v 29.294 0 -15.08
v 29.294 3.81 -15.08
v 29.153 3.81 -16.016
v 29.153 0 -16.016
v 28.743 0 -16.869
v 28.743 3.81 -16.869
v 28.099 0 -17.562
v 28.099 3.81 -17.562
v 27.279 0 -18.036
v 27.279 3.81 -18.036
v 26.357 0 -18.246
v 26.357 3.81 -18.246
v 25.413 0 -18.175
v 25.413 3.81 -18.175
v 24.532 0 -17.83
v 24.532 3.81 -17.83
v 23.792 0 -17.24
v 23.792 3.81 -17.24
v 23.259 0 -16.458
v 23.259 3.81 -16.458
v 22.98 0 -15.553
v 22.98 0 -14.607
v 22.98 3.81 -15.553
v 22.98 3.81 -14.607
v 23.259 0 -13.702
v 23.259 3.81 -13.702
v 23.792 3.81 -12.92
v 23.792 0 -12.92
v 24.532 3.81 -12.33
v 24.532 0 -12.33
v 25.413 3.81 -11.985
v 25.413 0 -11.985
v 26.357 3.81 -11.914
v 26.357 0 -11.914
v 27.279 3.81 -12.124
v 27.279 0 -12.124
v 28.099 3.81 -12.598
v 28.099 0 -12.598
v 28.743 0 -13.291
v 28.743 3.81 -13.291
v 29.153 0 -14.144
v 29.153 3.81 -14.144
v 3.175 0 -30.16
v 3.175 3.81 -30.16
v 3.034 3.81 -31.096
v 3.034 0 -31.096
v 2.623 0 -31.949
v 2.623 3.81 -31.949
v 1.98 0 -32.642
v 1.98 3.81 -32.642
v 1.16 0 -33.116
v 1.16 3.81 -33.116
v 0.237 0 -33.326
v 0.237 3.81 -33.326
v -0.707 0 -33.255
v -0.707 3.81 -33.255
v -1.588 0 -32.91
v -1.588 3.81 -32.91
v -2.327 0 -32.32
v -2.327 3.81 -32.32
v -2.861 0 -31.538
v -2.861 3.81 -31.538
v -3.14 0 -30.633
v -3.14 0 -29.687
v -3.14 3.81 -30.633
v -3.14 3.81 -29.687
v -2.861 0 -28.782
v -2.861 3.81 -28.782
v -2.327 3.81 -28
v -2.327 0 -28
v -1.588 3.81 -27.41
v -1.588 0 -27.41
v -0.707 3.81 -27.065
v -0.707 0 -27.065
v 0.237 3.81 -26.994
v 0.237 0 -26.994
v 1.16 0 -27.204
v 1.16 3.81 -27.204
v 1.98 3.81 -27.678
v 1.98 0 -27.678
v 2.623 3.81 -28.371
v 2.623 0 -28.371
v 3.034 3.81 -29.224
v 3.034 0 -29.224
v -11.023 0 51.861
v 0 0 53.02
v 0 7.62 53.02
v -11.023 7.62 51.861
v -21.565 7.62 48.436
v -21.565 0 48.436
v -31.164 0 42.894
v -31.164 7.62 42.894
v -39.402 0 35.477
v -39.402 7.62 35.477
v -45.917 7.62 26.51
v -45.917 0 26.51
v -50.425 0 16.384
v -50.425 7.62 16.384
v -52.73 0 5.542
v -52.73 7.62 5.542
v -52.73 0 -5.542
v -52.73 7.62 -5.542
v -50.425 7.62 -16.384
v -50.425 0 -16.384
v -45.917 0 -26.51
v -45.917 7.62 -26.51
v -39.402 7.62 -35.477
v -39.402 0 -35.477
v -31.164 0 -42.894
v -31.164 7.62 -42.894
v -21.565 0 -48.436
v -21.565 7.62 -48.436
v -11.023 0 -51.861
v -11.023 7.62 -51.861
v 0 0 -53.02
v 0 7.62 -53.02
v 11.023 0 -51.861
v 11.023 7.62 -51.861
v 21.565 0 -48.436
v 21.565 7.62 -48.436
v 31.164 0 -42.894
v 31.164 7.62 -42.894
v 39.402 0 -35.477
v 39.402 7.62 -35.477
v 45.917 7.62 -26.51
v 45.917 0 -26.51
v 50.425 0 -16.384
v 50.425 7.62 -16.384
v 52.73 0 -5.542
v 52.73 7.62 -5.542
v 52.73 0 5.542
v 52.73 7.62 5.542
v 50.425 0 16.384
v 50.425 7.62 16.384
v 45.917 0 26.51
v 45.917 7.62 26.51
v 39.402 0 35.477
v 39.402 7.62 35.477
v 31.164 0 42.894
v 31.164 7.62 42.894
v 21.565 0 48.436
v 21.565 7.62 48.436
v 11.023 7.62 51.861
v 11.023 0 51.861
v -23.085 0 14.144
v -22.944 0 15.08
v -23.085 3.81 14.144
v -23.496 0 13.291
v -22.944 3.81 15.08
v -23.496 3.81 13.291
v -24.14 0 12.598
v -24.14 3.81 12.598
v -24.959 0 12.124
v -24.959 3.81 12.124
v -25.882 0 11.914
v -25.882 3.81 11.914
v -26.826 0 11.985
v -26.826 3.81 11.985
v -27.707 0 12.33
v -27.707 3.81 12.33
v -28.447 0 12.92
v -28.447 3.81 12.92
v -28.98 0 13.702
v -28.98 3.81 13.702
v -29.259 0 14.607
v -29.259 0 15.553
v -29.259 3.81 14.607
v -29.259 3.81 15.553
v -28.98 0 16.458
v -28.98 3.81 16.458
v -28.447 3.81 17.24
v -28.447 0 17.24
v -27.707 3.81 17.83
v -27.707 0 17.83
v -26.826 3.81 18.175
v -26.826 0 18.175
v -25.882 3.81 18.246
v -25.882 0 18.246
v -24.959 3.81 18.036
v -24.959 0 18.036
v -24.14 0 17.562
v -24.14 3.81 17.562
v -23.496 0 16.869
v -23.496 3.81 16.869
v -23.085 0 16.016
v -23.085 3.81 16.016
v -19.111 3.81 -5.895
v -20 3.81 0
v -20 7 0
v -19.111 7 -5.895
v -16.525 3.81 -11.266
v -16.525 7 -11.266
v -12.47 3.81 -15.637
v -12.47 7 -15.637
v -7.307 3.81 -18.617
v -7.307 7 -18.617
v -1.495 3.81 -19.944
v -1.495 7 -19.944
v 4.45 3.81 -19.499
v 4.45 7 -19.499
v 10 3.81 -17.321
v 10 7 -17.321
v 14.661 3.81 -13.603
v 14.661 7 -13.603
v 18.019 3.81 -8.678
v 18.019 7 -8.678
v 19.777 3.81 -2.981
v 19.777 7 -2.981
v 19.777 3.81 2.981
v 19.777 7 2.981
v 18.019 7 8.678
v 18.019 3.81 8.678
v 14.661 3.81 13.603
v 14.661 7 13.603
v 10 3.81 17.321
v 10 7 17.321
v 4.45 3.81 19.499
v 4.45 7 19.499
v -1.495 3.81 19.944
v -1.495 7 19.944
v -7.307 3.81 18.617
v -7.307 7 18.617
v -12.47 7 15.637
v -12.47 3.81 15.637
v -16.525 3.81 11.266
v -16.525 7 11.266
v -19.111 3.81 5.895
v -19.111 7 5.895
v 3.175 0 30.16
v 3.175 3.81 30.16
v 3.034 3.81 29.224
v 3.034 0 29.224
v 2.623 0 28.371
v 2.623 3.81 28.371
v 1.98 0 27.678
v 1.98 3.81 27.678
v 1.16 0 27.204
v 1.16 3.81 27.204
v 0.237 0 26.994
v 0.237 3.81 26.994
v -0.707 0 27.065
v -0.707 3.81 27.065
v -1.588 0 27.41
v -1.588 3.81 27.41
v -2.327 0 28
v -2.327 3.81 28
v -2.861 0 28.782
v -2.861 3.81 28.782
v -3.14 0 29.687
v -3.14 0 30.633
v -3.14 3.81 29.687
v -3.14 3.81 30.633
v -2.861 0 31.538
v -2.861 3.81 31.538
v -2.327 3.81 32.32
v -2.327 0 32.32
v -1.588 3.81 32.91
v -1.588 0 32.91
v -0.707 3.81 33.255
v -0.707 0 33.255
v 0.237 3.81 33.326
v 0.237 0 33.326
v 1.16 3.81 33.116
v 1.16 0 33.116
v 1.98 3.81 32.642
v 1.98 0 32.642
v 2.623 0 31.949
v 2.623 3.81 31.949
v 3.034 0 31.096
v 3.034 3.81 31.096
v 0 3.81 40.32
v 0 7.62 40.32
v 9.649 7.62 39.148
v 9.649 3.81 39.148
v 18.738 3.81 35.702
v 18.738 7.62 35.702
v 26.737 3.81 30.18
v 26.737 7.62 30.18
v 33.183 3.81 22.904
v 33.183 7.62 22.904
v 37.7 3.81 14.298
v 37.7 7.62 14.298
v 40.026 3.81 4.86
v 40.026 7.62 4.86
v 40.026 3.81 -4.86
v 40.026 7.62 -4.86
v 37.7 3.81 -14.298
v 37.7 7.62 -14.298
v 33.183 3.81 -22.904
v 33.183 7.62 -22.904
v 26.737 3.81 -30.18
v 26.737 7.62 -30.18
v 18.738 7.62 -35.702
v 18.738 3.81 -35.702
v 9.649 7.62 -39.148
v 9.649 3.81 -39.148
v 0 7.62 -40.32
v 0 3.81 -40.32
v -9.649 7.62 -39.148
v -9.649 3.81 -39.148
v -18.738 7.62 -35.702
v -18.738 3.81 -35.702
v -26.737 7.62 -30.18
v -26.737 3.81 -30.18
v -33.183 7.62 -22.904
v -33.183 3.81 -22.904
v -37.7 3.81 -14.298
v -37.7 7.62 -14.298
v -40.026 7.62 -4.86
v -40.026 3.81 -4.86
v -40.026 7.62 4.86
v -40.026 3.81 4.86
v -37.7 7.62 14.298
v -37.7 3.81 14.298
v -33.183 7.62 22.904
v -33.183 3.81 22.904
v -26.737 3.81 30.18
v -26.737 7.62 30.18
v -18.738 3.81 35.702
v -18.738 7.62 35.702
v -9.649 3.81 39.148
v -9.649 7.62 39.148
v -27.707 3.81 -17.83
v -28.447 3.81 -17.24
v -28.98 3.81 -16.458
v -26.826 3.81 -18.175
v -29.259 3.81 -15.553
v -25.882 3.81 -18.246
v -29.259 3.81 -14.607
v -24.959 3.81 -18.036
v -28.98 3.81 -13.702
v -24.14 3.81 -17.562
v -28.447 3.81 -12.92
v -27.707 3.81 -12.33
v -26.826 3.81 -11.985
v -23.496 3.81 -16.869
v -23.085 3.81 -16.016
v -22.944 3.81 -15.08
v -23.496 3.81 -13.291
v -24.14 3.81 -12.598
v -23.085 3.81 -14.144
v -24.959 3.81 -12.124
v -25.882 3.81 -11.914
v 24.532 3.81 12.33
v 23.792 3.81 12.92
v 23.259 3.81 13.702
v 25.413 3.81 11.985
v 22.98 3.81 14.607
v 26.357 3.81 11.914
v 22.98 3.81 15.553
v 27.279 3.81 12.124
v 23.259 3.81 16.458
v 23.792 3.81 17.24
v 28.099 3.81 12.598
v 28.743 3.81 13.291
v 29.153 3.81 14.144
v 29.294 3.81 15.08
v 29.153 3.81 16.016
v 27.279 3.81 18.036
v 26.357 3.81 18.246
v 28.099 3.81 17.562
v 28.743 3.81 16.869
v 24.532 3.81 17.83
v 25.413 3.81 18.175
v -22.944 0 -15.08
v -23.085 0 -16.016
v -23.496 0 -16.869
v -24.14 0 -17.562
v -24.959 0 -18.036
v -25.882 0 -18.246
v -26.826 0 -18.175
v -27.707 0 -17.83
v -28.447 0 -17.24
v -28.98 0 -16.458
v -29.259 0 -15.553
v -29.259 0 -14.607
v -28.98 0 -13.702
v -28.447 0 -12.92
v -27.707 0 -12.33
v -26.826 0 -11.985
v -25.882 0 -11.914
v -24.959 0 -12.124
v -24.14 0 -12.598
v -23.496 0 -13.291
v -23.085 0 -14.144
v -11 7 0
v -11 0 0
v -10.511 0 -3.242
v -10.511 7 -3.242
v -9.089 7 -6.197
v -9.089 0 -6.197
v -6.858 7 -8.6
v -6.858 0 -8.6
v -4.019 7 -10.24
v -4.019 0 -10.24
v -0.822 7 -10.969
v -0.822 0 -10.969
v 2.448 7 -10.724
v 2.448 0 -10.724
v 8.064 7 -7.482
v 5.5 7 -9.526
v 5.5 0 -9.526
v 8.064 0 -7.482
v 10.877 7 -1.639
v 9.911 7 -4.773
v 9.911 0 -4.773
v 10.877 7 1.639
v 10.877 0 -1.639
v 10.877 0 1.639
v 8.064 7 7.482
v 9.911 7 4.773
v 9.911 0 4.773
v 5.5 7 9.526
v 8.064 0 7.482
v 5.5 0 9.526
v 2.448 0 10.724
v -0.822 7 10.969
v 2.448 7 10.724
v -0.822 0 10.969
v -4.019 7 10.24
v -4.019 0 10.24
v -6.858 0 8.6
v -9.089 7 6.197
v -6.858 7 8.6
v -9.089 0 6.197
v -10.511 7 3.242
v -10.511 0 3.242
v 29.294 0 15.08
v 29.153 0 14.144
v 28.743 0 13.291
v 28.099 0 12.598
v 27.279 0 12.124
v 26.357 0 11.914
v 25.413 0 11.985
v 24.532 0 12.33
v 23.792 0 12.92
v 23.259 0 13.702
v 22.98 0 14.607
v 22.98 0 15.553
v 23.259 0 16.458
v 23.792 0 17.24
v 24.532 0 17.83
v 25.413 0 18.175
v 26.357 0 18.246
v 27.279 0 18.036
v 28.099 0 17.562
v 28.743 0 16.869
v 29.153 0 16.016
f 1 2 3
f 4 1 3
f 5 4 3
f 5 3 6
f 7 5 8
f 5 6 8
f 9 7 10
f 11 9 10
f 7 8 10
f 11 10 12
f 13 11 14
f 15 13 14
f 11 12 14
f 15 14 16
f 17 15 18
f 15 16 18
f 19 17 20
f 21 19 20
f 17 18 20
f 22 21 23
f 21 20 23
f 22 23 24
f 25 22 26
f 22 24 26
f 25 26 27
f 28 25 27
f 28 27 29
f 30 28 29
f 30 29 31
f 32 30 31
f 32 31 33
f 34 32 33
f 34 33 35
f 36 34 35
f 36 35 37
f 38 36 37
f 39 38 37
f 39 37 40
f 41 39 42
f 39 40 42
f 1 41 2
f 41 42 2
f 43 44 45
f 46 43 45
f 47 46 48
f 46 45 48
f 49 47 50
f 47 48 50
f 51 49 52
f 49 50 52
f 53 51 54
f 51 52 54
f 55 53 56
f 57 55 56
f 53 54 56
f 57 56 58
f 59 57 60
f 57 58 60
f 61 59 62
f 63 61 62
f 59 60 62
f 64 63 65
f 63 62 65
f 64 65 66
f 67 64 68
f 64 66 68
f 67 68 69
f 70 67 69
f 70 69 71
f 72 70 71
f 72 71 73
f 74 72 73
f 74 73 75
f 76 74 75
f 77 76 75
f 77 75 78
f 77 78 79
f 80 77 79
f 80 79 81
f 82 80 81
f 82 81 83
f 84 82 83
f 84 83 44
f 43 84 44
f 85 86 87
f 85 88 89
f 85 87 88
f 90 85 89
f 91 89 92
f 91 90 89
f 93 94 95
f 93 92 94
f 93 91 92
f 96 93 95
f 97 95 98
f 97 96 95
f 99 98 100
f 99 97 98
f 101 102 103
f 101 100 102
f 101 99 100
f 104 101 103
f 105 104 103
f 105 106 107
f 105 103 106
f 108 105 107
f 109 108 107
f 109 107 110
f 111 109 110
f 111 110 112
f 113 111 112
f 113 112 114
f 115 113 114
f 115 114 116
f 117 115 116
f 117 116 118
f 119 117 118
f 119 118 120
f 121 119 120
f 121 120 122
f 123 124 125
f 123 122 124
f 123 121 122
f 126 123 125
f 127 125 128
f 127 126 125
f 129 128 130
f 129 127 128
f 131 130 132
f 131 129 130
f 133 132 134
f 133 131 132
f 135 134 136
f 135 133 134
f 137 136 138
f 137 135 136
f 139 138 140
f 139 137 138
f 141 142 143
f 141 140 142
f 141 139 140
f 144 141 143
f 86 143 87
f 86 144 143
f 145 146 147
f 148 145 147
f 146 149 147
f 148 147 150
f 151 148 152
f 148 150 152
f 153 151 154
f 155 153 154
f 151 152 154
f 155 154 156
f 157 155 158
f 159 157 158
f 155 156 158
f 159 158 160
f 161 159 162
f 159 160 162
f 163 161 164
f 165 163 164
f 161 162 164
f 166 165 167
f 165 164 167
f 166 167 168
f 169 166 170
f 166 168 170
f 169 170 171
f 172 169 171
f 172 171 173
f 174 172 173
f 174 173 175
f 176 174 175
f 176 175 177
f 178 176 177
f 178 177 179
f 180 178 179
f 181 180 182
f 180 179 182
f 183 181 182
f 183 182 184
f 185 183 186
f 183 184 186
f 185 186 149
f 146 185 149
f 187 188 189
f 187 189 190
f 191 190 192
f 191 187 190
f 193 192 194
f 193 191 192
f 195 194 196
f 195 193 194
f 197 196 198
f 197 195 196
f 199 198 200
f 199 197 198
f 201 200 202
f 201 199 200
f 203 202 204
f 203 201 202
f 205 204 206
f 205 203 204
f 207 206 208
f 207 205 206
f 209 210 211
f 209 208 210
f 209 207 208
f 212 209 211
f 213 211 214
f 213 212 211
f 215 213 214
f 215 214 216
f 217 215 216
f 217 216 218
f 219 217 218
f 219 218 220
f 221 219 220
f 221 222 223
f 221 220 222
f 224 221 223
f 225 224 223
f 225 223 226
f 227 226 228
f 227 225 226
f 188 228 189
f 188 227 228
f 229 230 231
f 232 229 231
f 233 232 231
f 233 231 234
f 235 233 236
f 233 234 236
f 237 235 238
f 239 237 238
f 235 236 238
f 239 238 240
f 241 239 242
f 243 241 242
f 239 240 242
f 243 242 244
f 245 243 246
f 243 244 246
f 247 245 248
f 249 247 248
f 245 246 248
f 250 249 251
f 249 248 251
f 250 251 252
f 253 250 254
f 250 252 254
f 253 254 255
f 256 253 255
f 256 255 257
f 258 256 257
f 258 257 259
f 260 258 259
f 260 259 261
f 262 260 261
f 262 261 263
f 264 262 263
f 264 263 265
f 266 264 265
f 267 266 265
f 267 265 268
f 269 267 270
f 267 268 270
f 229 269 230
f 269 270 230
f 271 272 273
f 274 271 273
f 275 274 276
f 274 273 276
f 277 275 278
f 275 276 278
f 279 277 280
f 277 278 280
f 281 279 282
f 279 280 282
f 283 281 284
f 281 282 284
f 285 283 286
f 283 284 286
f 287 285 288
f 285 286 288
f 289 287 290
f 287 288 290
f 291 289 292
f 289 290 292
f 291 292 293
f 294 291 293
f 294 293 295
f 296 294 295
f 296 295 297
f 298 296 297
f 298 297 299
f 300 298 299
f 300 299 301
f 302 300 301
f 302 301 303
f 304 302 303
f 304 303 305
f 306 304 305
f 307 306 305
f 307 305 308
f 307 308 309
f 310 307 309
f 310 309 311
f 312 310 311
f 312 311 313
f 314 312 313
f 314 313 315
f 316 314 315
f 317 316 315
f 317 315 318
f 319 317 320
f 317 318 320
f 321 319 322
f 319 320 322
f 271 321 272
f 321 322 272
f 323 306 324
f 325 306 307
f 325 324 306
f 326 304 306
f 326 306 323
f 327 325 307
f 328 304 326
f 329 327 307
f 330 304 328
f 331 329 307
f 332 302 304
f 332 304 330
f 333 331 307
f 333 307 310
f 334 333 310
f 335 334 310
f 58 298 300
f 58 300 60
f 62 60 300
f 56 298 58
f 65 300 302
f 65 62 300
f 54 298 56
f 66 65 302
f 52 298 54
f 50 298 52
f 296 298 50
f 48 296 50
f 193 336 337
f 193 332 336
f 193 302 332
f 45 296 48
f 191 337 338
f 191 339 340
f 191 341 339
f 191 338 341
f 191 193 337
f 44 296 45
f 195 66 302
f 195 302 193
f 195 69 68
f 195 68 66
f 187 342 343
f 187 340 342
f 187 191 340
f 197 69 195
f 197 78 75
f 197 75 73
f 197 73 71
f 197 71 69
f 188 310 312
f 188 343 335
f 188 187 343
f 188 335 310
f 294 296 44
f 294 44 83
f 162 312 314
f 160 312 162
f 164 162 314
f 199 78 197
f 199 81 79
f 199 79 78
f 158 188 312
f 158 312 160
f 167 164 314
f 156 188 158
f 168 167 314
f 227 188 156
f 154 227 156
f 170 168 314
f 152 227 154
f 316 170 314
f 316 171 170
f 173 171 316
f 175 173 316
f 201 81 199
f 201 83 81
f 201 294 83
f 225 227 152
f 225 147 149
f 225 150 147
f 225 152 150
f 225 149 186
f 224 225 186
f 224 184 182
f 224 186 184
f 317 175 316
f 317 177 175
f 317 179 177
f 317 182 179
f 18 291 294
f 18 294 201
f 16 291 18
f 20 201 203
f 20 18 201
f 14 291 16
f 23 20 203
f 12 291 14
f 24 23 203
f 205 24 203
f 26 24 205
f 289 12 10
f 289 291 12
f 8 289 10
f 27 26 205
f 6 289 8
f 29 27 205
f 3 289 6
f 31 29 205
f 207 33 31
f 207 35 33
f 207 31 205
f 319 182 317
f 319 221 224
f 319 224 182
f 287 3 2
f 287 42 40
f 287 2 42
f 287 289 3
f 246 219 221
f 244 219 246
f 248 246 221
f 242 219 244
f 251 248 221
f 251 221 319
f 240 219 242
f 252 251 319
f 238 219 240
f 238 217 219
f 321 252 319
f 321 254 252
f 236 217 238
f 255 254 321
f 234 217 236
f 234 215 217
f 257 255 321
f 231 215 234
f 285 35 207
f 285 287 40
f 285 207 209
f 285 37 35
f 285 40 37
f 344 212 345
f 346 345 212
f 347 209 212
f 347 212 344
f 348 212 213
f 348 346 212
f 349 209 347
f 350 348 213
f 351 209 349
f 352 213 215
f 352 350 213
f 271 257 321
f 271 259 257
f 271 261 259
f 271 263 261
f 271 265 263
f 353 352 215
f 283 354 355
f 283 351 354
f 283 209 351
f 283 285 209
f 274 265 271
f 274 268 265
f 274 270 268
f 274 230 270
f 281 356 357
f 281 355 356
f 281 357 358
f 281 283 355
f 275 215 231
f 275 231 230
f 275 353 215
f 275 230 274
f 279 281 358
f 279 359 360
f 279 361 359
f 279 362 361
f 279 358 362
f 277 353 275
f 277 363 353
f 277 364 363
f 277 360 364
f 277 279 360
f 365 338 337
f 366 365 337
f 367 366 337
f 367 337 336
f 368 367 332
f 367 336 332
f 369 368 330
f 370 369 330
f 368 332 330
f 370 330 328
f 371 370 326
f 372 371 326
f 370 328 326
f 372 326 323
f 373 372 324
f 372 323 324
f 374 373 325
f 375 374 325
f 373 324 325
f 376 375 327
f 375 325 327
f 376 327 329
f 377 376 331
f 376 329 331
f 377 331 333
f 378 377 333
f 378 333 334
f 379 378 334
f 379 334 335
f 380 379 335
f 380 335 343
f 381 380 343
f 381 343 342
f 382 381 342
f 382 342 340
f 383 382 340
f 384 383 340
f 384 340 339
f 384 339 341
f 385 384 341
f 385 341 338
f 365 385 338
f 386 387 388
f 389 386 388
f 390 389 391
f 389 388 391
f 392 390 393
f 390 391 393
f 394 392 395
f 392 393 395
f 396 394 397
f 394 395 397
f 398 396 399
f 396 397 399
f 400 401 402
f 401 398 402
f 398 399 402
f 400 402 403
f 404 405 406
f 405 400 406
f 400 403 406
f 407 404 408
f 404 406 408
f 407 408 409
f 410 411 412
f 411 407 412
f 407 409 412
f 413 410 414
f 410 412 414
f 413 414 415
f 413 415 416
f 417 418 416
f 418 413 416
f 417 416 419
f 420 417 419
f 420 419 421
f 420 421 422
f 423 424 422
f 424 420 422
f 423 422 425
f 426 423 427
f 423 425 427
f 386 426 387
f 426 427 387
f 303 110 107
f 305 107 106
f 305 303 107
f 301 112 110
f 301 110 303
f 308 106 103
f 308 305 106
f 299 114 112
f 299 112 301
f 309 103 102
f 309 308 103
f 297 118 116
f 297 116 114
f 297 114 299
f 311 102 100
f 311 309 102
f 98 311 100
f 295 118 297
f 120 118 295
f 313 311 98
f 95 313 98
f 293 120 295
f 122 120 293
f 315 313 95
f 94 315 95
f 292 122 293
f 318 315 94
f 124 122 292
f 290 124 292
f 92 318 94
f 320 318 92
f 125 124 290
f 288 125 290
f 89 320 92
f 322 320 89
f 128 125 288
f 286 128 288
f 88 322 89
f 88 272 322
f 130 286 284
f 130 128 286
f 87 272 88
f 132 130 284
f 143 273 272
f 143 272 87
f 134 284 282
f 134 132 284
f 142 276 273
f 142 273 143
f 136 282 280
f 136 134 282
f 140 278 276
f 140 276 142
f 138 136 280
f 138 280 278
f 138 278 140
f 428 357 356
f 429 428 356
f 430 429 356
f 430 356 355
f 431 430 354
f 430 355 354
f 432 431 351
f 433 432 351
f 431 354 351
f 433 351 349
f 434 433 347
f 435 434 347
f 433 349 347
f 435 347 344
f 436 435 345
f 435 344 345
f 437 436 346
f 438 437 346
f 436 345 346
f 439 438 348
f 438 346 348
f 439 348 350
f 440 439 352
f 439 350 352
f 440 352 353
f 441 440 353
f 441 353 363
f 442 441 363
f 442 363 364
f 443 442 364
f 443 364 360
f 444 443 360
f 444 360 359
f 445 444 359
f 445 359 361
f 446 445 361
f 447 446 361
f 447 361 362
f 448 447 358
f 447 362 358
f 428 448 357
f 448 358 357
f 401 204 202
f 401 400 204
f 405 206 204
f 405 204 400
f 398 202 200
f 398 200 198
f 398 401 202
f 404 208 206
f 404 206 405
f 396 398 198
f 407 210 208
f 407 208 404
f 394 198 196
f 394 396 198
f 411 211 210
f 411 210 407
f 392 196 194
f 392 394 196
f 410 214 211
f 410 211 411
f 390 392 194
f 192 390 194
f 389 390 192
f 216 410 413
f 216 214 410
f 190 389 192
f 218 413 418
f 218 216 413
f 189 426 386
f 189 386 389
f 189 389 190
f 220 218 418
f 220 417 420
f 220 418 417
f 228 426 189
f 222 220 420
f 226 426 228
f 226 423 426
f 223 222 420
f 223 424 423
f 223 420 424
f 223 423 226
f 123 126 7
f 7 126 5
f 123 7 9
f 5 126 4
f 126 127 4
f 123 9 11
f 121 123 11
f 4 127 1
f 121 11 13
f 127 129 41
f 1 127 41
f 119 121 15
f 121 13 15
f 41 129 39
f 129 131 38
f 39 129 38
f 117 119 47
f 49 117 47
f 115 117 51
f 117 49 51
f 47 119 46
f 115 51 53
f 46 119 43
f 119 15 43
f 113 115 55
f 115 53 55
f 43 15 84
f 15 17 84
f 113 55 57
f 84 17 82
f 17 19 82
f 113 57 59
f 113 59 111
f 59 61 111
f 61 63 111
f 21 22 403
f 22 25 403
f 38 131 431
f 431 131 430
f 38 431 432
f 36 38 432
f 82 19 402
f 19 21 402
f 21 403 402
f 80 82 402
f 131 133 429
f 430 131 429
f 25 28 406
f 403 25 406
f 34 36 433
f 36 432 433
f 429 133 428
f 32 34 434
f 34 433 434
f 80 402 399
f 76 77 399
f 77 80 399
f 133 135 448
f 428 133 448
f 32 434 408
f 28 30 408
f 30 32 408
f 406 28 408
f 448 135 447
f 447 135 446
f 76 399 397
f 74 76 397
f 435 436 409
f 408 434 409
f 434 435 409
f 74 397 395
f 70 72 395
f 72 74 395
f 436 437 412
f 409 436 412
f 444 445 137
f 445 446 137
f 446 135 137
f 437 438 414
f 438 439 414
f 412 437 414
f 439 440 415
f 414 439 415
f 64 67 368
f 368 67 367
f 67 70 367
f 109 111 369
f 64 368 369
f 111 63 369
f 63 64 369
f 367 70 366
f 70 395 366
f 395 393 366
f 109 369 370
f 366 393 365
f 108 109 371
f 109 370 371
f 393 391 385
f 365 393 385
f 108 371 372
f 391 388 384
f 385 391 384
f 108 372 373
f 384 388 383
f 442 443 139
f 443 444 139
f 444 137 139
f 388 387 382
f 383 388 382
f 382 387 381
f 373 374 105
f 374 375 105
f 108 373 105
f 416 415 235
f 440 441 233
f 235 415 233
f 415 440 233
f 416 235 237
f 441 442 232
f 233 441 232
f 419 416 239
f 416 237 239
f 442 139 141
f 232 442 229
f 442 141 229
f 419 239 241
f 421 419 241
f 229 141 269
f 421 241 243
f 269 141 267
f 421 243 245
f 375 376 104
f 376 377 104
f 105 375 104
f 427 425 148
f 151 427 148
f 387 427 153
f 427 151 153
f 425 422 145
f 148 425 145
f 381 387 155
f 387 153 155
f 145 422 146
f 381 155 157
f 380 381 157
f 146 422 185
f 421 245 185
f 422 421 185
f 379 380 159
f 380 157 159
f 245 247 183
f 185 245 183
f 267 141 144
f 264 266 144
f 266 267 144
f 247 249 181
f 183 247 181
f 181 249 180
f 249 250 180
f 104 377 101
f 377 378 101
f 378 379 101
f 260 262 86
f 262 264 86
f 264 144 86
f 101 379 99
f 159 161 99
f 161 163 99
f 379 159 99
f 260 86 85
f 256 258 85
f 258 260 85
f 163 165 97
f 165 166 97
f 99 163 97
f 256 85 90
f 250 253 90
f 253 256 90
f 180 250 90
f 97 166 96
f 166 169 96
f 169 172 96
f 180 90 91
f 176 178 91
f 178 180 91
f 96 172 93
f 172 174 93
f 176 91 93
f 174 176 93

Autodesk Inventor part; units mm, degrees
ref_plane "YZ Plane" through (0, 0, 0) normal (1, 0, 0) x (0, 1, 0)
ref_plane "XZ Plane" through (0, 0, 0) normal (0, 1, 0) x (-1, 0, 0)
ref_plane "XY Plane" through (0, 0, 0) normal (0, 0, 1) x (1, 0, 0)
sketch "Sketch1" plane through (0, 0, 0) normal (0, 1, 0) x (-1, 0, 0)
  circle A0 centre (0, 0) radius 11
  circle A1 centre (0, 0) radius 20
  dimension "d0" = 22
  dimension "d1" = 40
extrude "Extrusion1" add sketch "Sketch1" along normal blind 7
sketch "Sketch2" plane through (0, 0, 0) normal (1, 0, 0) x (0, 1, 0)
  line L0 (0, 40.32) -> (7.62, 40.32)
  line L1 (7.62, 40.32) -> (7.62, 53.02)
  line L2 (7.62, 53.02) -> (0, 53.02)
  line L3 (0, 53.02) -> (0, 40.32)
  line L4 (0, 40.32) -> (3.81, 40.32)
  line L5 (3.81, 40.32) -> (3.81, 20)
  line L6 (3.81, 20) -> (0, 20)
  line L7 (0, 20) -> (0, 40.32)
  line L8 (-1.524, 0) -> (9.144, 0) projected
  point P0 (0, 0)
  dimension "d4" = 20.32
  dimension "d5" = 7.62
  dimension "d6" = 20
  dimension "d7" = 3.81
  dimension "d8" = 12.7
revolve "Revolution1" add sketch "Sketch2" angle 360 about axis through (0, -10, 0) along (0, 1, 0)
sketch "Sketch3" plane through (0, 3.81, 0) normal (0, 1, 0) x (1, 0, 0)
  circle A0 centre (0, 0) radius 40.32 construction
  circle A1 centre (0, 0) radius 20 construction
  circle A2 centre (0, 30.16) radius 3.175
  line L0 (0, 30.16) -> (0, 20)
  line L1 (0, 30.16) -> (0, 40.32)
  circle A3 centre (-26.1193, 15.08) radius 3.175
  circle A4 centre (-26.1193, -15.08) radius 3.175
  circle A5 centre (0, -30.16) radius 3.175
  circle A6 centre (26.1193, -15.08) radius 3.175
  circle A7 centre (26.1193, 15.08) radius 3.175
  dimension "d10" = 6.35
  dimension "d13" = 360
extrude "Extrusion2" cut sketch "Sketch3" against normal blind 7
properties part number "OuterBearingHolder"
